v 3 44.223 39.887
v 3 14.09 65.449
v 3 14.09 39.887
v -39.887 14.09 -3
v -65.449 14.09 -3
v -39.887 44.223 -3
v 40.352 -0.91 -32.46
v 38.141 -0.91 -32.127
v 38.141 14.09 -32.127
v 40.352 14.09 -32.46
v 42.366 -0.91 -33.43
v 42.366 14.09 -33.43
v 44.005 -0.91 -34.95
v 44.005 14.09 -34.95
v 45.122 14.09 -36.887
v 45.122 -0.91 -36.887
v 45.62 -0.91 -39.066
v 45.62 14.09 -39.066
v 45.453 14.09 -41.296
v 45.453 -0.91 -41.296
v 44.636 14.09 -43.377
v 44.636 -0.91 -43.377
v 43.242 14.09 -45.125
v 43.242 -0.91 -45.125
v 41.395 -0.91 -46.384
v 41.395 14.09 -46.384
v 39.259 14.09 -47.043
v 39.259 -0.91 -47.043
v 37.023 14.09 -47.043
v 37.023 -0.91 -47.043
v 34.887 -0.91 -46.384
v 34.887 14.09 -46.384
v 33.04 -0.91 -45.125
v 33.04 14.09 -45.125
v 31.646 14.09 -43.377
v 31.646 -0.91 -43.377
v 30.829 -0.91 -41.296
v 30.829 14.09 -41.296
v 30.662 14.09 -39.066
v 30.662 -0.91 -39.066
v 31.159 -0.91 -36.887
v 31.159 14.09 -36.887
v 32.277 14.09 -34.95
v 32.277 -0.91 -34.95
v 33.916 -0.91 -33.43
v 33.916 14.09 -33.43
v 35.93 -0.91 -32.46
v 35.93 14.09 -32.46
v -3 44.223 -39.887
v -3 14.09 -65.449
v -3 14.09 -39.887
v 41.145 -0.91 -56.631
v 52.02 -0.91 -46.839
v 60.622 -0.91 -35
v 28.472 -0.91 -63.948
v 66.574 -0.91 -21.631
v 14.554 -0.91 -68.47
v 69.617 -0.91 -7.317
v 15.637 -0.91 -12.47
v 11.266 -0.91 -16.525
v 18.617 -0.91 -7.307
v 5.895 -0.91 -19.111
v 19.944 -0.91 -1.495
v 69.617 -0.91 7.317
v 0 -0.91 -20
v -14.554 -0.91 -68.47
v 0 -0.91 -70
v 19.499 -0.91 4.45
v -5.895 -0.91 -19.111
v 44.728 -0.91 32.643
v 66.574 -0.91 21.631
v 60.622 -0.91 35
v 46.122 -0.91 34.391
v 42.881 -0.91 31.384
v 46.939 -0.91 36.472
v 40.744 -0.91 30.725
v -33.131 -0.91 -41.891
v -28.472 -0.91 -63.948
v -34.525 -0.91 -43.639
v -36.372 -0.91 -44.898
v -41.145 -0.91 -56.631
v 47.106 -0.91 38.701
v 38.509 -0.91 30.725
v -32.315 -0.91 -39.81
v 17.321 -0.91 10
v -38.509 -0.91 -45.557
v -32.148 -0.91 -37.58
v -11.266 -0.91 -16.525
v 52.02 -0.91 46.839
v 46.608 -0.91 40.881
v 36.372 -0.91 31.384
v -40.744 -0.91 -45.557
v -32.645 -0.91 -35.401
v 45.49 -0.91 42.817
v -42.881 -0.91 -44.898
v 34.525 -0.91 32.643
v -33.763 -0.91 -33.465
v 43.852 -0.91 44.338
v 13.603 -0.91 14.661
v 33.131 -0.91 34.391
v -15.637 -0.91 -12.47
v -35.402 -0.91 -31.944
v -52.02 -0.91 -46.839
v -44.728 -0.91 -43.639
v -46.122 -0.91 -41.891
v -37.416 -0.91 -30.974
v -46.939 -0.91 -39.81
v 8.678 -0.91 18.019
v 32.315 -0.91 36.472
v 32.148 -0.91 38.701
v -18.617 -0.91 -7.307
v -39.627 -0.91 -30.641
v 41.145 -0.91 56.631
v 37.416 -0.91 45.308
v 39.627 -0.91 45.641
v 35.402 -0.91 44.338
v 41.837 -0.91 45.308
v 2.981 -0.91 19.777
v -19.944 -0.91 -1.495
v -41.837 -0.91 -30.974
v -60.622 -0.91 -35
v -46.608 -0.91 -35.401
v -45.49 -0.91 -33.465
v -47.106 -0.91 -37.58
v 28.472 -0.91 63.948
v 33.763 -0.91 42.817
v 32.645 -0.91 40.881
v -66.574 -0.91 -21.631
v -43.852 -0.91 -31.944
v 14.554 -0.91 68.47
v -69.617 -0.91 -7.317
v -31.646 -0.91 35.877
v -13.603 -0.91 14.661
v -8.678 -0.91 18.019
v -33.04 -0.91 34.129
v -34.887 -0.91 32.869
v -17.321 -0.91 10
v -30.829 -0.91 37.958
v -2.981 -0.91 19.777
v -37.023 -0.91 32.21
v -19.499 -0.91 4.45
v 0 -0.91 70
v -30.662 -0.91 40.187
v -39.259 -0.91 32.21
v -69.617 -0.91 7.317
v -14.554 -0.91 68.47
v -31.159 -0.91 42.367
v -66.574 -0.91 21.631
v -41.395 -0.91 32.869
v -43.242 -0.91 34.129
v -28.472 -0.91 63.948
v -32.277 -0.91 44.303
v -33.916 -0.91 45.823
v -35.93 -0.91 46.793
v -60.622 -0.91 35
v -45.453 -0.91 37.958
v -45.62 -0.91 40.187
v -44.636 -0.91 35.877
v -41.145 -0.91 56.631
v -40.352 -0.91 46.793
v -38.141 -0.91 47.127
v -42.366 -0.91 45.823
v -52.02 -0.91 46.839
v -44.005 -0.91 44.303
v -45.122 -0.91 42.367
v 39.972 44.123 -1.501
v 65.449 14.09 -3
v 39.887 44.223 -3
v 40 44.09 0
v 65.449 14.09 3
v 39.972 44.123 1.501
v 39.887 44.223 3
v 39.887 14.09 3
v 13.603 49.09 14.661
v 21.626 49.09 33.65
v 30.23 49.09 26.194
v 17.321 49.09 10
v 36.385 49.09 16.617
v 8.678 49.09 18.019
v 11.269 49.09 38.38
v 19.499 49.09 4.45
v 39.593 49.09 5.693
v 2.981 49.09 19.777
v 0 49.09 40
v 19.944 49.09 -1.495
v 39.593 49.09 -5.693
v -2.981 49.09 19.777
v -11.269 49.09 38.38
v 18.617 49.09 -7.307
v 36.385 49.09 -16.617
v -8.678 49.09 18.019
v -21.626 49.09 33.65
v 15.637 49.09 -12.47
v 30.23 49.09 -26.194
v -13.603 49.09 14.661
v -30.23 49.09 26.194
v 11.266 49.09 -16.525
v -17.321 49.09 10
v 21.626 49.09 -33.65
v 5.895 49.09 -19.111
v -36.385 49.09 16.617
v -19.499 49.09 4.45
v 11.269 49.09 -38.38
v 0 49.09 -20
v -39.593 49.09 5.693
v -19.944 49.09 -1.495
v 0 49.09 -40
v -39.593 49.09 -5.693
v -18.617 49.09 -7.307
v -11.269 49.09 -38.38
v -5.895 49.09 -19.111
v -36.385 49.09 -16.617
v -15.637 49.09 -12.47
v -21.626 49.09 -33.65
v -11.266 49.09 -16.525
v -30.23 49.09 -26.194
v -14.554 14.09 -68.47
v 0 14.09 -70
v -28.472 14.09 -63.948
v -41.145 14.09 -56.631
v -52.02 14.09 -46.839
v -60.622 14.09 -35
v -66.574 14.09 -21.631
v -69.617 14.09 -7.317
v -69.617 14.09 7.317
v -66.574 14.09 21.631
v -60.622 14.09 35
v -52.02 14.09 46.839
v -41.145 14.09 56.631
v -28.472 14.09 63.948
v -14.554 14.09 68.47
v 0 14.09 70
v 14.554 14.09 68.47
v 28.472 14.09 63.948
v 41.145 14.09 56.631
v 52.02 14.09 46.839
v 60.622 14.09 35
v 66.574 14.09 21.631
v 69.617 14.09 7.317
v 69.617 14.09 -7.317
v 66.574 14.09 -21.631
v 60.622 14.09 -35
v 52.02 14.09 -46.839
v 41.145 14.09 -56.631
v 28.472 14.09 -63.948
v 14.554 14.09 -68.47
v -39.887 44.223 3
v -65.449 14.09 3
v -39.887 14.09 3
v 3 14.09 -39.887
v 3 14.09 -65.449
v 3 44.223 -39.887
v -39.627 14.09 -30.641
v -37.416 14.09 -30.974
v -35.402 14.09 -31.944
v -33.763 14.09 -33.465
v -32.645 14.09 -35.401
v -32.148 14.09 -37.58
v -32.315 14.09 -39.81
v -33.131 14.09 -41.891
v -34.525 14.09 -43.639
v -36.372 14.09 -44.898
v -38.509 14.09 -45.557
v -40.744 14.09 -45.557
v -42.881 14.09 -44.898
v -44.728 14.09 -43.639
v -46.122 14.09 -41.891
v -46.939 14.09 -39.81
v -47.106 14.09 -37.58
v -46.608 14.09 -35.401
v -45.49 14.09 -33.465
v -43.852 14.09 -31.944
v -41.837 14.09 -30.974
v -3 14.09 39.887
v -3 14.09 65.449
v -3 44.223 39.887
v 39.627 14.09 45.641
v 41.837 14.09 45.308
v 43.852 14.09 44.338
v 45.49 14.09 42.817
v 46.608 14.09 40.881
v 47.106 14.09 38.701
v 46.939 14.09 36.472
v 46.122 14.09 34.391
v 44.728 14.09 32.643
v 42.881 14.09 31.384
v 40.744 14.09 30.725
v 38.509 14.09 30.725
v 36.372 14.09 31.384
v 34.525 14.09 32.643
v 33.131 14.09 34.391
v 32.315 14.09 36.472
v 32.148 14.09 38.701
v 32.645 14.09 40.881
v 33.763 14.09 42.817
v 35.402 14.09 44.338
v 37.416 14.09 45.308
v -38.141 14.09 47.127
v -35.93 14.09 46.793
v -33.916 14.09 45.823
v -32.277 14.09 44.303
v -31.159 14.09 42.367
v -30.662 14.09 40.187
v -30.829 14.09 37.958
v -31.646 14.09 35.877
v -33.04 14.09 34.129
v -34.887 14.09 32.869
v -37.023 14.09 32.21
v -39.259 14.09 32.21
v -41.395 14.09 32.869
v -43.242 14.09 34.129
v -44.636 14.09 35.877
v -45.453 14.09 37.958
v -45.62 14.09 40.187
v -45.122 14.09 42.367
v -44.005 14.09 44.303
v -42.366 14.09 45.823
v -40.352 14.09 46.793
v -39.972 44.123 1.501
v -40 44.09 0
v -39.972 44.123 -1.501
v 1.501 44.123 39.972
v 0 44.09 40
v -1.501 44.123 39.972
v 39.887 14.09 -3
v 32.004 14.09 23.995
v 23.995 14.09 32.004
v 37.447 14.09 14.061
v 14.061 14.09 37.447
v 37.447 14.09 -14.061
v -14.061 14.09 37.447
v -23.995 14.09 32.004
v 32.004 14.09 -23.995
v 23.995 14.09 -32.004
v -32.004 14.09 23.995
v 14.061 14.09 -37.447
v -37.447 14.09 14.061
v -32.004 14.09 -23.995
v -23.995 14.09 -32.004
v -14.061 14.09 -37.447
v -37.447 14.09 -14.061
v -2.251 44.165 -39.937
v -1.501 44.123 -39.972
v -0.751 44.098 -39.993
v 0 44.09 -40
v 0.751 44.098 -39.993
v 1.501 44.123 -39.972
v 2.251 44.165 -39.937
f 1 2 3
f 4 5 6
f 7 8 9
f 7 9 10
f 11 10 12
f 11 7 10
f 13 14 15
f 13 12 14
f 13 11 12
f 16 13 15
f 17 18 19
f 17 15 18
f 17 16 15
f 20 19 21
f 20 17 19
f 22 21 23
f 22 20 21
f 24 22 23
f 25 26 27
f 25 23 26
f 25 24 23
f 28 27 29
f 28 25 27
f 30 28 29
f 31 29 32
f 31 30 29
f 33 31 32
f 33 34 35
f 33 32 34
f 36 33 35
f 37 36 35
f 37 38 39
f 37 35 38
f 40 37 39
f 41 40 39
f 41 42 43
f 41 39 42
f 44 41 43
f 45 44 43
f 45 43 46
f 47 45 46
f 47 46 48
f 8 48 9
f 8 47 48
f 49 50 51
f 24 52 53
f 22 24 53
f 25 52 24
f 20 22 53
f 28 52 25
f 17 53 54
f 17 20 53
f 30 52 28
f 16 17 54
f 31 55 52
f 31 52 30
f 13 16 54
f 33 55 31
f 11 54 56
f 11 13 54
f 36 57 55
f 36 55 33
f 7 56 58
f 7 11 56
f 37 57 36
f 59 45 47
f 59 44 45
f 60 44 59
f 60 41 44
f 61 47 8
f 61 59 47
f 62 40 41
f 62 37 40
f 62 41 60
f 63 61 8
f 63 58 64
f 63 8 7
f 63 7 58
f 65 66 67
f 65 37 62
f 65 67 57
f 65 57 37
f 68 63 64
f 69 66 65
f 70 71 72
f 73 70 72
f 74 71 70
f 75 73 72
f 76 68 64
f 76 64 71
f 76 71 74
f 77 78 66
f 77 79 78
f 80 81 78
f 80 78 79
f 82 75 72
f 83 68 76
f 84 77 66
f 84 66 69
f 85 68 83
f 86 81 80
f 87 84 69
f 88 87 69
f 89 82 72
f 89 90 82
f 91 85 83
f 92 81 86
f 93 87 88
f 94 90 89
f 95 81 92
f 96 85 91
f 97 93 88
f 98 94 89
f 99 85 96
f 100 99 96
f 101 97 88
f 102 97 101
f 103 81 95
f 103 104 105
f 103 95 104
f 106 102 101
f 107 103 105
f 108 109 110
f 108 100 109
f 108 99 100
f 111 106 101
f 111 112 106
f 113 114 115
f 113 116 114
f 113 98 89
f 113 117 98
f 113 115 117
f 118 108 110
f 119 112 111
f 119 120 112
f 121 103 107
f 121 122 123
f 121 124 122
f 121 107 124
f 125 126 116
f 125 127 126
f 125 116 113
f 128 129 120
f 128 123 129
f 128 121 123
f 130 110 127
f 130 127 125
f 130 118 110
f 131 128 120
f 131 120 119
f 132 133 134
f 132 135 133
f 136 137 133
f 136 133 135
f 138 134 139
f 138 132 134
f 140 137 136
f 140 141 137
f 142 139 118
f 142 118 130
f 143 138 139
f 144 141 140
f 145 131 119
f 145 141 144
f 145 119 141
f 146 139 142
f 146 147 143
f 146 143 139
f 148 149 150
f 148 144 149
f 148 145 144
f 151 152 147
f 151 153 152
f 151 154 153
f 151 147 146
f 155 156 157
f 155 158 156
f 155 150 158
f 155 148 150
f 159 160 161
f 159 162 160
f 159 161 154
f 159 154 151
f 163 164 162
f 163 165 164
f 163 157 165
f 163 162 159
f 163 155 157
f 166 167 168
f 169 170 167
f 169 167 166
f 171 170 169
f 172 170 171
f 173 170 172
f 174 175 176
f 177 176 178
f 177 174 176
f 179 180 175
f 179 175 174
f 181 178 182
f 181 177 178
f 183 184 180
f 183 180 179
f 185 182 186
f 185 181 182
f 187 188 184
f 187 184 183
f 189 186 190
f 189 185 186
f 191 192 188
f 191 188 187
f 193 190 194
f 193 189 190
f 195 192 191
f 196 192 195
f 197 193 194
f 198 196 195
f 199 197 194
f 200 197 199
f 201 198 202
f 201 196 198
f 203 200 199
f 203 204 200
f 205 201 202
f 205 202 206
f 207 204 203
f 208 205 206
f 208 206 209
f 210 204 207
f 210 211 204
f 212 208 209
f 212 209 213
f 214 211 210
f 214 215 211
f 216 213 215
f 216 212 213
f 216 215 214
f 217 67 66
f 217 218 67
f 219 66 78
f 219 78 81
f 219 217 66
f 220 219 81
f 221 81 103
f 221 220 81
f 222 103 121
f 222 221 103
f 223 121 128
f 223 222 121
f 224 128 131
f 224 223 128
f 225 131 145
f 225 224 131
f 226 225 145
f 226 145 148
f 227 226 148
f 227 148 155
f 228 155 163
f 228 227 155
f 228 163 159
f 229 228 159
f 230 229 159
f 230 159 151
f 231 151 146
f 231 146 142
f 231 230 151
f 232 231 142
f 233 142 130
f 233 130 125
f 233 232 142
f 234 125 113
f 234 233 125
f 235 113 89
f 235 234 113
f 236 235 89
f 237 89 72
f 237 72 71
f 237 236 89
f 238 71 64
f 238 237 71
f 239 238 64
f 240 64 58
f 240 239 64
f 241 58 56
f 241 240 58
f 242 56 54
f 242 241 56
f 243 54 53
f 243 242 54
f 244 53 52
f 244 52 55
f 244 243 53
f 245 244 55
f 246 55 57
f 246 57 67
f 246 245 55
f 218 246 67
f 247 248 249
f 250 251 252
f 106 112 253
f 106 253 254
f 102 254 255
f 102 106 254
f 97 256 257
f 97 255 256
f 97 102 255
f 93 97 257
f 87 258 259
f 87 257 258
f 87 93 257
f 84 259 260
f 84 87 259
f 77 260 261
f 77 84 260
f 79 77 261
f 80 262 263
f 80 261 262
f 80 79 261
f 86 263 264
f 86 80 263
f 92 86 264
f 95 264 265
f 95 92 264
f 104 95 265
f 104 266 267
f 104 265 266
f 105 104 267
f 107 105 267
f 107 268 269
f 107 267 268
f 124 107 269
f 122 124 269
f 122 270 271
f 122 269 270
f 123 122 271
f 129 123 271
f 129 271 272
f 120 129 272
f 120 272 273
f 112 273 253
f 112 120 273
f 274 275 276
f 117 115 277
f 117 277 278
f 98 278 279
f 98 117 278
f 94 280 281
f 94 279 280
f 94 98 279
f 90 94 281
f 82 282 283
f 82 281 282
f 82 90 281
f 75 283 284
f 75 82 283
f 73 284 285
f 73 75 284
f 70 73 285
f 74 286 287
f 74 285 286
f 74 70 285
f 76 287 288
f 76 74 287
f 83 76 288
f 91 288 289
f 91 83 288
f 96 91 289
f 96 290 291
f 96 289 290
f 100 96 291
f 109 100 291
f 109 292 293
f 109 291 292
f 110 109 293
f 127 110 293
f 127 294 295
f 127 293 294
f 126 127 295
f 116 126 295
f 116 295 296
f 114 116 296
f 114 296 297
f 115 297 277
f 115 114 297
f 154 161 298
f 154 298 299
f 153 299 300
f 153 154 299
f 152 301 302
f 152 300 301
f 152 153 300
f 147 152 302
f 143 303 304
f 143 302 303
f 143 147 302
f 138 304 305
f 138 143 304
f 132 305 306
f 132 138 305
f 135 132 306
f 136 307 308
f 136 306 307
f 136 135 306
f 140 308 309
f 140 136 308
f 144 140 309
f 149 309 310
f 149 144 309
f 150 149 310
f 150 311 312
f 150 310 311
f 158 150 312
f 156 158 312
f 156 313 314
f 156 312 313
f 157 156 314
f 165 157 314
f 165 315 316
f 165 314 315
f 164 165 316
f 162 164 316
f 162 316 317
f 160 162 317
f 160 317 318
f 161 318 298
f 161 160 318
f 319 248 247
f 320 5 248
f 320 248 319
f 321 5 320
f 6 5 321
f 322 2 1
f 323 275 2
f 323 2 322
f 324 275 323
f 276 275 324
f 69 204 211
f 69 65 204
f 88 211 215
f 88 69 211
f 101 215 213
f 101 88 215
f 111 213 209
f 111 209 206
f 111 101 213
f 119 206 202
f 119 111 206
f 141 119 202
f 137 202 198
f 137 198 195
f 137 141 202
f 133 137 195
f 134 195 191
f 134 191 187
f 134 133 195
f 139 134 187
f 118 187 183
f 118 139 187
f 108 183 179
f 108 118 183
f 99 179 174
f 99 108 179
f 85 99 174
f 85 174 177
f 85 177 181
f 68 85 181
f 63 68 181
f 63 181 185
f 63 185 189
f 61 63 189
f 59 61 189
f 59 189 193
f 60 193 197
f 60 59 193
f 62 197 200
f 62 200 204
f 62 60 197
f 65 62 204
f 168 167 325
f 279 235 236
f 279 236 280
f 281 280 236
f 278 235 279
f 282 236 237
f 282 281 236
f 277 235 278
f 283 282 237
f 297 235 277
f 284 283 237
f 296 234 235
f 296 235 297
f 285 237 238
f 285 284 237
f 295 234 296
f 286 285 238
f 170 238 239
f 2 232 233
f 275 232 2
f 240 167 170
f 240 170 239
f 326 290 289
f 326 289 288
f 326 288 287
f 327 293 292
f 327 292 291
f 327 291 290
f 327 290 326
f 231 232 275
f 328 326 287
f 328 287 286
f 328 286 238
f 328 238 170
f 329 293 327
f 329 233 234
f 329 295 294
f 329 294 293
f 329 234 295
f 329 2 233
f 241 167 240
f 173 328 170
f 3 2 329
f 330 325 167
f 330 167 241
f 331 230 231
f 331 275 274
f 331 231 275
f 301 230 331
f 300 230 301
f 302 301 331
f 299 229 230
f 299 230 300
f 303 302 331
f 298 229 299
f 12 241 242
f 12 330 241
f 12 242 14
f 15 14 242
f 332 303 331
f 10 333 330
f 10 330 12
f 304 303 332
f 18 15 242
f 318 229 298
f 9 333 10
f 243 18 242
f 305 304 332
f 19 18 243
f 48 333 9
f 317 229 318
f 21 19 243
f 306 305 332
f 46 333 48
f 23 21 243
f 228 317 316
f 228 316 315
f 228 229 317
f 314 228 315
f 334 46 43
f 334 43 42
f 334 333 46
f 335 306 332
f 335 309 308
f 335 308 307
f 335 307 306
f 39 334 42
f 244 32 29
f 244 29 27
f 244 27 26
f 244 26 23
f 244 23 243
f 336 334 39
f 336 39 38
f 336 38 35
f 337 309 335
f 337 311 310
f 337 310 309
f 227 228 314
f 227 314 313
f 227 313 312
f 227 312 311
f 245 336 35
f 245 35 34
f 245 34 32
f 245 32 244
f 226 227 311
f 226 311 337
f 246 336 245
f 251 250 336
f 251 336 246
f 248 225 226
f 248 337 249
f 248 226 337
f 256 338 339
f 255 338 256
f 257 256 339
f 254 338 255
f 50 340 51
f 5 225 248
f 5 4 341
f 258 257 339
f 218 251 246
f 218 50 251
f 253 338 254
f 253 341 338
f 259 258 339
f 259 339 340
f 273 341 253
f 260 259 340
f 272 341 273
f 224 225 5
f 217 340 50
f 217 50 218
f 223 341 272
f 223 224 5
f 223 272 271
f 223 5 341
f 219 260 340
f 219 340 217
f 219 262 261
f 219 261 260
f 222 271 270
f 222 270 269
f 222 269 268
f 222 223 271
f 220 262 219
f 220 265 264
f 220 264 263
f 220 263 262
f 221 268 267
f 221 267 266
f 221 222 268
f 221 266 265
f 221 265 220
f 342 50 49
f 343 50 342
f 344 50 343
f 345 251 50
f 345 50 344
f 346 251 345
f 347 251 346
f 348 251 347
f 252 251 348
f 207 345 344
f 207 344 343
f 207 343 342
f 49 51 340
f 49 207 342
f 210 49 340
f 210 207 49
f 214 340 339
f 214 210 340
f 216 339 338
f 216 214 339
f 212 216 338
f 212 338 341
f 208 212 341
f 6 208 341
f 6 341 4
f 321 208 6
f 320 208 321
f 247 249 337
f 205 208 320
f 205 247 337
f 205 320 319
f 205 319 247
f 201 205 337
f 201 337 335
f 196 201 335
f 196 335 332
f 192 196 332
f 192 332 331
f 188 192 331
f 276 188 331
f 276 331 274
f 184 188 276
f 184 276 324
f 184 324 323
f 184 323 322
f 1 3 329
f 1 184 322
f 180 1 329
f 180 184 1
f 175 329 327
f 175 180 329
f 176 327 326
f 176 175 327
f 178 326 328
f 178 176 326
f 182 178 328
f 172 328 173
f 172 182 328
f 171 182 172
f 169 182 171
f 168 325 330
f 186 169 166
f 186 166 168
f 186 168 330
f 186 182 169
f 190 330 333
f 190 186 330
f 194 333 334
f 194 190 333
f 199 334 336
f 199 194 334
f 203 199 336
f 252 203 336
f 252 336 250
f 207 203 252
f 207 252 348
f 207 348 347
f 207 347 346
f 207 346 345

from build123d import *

# Parameters (mm, degrees)
RIB1_REACH              = 112.498
SKETCH2_WALL_W          = 261.642553204
SKETCH2_WALL_H          = 6
CUT_EXTRUDE2_DEPTH      = 111.497997453
CUT_EXTRUDE2_DEPTH_BACK = 10
SKETCH4_R               = 7.5
CIRPATTERN6_COUNT       = 4


with BuildPart() as part:
    # Sketch1 → Revolve1 (revolve)
    with BuildSketch(Plane.XY, mode=Mode.PRIVATE) as revolve1_sk:
        Polygon((20, 49.089789582), (20, -0.910210418), (70, -0.910210418), (70, 14.089789582), (40, 14.089789582), (40, 49.089789582), align=None)
    revolve(revolve1_sk.sketch.rotate(Axis((0, 0, 0), (0, 1, 0)), 90), axis=Axis((0, 0, 0), (0, 1, 0)))

    # Sketch2 wall → Rib1 (add, up to next)
    with BuildSketch(Plane(origin=(-52.5, 29.354148536, 0), x_dir=(0.646888134458, 0.76258490773, 0), z_dir=(-0.76258490773, 0.646888134458, 0)), mode=Mode.PRIVATE) as rib1_sk1:
        Rectangle(SKETCH2_WALL_W, SKETCH2_WALL_H)
    rib1_tool1 = extrude(rib1_sk1.sketch, amount=-RIB1_REACH, mode=Mode.PRIVATE) - part.part
    rib1 = rib1_tool1.solids().sort_by_distance((-52.5, 29.354148536, 0))[0]
    add(rib1)

    # Sketch4 → Cut-Extrude2 (cut, two sides: drawn at the far end of the back side and taken through both)
    with BuildSketch(Plane(origin=(0, 0, 0), x_dir=(1, 0, 0), z_dir=(0, 1, 0)).offset(-CUT_EXTRUDE2_DEPTH_BACK)):
        with Locations(Location((-39.62662351, 38.140932201, 0), (0, 0, 270))):
            Circle(SKETCH4_R)
        with Locations(Location((38.140932201, 39.62662351, 0), (0, 0, 270))):
            Circle(SKETCH4_R)
        with Locations(Location((39.62662351, -38.140932201, 0), (0, 0, 270))):
            Circle(SKETCH4_R)
        with Locations(Location((-38.140932201, -39.62662351, 0), (0, 0, 270))):
            Circle(SKETCH4_R)
    extrude(amount=CUT_EXTRUDE2_DEPTH + CUT_EXTRUDE2_DEPTH_BACK, mode=Mode.SUBTRACT)

    # CirPattern6: Rib1 ×4 about axis
    cirpattern6_axis = Axis((0, 0, 0), (0, 1, 0))
    for i in range(1, CIRPATTERN6_COUNT):
        add(rib1.rotate(cirpattern6_axis, i * 360 / CIRPATTERN6_COUNT))


solid = part.part
